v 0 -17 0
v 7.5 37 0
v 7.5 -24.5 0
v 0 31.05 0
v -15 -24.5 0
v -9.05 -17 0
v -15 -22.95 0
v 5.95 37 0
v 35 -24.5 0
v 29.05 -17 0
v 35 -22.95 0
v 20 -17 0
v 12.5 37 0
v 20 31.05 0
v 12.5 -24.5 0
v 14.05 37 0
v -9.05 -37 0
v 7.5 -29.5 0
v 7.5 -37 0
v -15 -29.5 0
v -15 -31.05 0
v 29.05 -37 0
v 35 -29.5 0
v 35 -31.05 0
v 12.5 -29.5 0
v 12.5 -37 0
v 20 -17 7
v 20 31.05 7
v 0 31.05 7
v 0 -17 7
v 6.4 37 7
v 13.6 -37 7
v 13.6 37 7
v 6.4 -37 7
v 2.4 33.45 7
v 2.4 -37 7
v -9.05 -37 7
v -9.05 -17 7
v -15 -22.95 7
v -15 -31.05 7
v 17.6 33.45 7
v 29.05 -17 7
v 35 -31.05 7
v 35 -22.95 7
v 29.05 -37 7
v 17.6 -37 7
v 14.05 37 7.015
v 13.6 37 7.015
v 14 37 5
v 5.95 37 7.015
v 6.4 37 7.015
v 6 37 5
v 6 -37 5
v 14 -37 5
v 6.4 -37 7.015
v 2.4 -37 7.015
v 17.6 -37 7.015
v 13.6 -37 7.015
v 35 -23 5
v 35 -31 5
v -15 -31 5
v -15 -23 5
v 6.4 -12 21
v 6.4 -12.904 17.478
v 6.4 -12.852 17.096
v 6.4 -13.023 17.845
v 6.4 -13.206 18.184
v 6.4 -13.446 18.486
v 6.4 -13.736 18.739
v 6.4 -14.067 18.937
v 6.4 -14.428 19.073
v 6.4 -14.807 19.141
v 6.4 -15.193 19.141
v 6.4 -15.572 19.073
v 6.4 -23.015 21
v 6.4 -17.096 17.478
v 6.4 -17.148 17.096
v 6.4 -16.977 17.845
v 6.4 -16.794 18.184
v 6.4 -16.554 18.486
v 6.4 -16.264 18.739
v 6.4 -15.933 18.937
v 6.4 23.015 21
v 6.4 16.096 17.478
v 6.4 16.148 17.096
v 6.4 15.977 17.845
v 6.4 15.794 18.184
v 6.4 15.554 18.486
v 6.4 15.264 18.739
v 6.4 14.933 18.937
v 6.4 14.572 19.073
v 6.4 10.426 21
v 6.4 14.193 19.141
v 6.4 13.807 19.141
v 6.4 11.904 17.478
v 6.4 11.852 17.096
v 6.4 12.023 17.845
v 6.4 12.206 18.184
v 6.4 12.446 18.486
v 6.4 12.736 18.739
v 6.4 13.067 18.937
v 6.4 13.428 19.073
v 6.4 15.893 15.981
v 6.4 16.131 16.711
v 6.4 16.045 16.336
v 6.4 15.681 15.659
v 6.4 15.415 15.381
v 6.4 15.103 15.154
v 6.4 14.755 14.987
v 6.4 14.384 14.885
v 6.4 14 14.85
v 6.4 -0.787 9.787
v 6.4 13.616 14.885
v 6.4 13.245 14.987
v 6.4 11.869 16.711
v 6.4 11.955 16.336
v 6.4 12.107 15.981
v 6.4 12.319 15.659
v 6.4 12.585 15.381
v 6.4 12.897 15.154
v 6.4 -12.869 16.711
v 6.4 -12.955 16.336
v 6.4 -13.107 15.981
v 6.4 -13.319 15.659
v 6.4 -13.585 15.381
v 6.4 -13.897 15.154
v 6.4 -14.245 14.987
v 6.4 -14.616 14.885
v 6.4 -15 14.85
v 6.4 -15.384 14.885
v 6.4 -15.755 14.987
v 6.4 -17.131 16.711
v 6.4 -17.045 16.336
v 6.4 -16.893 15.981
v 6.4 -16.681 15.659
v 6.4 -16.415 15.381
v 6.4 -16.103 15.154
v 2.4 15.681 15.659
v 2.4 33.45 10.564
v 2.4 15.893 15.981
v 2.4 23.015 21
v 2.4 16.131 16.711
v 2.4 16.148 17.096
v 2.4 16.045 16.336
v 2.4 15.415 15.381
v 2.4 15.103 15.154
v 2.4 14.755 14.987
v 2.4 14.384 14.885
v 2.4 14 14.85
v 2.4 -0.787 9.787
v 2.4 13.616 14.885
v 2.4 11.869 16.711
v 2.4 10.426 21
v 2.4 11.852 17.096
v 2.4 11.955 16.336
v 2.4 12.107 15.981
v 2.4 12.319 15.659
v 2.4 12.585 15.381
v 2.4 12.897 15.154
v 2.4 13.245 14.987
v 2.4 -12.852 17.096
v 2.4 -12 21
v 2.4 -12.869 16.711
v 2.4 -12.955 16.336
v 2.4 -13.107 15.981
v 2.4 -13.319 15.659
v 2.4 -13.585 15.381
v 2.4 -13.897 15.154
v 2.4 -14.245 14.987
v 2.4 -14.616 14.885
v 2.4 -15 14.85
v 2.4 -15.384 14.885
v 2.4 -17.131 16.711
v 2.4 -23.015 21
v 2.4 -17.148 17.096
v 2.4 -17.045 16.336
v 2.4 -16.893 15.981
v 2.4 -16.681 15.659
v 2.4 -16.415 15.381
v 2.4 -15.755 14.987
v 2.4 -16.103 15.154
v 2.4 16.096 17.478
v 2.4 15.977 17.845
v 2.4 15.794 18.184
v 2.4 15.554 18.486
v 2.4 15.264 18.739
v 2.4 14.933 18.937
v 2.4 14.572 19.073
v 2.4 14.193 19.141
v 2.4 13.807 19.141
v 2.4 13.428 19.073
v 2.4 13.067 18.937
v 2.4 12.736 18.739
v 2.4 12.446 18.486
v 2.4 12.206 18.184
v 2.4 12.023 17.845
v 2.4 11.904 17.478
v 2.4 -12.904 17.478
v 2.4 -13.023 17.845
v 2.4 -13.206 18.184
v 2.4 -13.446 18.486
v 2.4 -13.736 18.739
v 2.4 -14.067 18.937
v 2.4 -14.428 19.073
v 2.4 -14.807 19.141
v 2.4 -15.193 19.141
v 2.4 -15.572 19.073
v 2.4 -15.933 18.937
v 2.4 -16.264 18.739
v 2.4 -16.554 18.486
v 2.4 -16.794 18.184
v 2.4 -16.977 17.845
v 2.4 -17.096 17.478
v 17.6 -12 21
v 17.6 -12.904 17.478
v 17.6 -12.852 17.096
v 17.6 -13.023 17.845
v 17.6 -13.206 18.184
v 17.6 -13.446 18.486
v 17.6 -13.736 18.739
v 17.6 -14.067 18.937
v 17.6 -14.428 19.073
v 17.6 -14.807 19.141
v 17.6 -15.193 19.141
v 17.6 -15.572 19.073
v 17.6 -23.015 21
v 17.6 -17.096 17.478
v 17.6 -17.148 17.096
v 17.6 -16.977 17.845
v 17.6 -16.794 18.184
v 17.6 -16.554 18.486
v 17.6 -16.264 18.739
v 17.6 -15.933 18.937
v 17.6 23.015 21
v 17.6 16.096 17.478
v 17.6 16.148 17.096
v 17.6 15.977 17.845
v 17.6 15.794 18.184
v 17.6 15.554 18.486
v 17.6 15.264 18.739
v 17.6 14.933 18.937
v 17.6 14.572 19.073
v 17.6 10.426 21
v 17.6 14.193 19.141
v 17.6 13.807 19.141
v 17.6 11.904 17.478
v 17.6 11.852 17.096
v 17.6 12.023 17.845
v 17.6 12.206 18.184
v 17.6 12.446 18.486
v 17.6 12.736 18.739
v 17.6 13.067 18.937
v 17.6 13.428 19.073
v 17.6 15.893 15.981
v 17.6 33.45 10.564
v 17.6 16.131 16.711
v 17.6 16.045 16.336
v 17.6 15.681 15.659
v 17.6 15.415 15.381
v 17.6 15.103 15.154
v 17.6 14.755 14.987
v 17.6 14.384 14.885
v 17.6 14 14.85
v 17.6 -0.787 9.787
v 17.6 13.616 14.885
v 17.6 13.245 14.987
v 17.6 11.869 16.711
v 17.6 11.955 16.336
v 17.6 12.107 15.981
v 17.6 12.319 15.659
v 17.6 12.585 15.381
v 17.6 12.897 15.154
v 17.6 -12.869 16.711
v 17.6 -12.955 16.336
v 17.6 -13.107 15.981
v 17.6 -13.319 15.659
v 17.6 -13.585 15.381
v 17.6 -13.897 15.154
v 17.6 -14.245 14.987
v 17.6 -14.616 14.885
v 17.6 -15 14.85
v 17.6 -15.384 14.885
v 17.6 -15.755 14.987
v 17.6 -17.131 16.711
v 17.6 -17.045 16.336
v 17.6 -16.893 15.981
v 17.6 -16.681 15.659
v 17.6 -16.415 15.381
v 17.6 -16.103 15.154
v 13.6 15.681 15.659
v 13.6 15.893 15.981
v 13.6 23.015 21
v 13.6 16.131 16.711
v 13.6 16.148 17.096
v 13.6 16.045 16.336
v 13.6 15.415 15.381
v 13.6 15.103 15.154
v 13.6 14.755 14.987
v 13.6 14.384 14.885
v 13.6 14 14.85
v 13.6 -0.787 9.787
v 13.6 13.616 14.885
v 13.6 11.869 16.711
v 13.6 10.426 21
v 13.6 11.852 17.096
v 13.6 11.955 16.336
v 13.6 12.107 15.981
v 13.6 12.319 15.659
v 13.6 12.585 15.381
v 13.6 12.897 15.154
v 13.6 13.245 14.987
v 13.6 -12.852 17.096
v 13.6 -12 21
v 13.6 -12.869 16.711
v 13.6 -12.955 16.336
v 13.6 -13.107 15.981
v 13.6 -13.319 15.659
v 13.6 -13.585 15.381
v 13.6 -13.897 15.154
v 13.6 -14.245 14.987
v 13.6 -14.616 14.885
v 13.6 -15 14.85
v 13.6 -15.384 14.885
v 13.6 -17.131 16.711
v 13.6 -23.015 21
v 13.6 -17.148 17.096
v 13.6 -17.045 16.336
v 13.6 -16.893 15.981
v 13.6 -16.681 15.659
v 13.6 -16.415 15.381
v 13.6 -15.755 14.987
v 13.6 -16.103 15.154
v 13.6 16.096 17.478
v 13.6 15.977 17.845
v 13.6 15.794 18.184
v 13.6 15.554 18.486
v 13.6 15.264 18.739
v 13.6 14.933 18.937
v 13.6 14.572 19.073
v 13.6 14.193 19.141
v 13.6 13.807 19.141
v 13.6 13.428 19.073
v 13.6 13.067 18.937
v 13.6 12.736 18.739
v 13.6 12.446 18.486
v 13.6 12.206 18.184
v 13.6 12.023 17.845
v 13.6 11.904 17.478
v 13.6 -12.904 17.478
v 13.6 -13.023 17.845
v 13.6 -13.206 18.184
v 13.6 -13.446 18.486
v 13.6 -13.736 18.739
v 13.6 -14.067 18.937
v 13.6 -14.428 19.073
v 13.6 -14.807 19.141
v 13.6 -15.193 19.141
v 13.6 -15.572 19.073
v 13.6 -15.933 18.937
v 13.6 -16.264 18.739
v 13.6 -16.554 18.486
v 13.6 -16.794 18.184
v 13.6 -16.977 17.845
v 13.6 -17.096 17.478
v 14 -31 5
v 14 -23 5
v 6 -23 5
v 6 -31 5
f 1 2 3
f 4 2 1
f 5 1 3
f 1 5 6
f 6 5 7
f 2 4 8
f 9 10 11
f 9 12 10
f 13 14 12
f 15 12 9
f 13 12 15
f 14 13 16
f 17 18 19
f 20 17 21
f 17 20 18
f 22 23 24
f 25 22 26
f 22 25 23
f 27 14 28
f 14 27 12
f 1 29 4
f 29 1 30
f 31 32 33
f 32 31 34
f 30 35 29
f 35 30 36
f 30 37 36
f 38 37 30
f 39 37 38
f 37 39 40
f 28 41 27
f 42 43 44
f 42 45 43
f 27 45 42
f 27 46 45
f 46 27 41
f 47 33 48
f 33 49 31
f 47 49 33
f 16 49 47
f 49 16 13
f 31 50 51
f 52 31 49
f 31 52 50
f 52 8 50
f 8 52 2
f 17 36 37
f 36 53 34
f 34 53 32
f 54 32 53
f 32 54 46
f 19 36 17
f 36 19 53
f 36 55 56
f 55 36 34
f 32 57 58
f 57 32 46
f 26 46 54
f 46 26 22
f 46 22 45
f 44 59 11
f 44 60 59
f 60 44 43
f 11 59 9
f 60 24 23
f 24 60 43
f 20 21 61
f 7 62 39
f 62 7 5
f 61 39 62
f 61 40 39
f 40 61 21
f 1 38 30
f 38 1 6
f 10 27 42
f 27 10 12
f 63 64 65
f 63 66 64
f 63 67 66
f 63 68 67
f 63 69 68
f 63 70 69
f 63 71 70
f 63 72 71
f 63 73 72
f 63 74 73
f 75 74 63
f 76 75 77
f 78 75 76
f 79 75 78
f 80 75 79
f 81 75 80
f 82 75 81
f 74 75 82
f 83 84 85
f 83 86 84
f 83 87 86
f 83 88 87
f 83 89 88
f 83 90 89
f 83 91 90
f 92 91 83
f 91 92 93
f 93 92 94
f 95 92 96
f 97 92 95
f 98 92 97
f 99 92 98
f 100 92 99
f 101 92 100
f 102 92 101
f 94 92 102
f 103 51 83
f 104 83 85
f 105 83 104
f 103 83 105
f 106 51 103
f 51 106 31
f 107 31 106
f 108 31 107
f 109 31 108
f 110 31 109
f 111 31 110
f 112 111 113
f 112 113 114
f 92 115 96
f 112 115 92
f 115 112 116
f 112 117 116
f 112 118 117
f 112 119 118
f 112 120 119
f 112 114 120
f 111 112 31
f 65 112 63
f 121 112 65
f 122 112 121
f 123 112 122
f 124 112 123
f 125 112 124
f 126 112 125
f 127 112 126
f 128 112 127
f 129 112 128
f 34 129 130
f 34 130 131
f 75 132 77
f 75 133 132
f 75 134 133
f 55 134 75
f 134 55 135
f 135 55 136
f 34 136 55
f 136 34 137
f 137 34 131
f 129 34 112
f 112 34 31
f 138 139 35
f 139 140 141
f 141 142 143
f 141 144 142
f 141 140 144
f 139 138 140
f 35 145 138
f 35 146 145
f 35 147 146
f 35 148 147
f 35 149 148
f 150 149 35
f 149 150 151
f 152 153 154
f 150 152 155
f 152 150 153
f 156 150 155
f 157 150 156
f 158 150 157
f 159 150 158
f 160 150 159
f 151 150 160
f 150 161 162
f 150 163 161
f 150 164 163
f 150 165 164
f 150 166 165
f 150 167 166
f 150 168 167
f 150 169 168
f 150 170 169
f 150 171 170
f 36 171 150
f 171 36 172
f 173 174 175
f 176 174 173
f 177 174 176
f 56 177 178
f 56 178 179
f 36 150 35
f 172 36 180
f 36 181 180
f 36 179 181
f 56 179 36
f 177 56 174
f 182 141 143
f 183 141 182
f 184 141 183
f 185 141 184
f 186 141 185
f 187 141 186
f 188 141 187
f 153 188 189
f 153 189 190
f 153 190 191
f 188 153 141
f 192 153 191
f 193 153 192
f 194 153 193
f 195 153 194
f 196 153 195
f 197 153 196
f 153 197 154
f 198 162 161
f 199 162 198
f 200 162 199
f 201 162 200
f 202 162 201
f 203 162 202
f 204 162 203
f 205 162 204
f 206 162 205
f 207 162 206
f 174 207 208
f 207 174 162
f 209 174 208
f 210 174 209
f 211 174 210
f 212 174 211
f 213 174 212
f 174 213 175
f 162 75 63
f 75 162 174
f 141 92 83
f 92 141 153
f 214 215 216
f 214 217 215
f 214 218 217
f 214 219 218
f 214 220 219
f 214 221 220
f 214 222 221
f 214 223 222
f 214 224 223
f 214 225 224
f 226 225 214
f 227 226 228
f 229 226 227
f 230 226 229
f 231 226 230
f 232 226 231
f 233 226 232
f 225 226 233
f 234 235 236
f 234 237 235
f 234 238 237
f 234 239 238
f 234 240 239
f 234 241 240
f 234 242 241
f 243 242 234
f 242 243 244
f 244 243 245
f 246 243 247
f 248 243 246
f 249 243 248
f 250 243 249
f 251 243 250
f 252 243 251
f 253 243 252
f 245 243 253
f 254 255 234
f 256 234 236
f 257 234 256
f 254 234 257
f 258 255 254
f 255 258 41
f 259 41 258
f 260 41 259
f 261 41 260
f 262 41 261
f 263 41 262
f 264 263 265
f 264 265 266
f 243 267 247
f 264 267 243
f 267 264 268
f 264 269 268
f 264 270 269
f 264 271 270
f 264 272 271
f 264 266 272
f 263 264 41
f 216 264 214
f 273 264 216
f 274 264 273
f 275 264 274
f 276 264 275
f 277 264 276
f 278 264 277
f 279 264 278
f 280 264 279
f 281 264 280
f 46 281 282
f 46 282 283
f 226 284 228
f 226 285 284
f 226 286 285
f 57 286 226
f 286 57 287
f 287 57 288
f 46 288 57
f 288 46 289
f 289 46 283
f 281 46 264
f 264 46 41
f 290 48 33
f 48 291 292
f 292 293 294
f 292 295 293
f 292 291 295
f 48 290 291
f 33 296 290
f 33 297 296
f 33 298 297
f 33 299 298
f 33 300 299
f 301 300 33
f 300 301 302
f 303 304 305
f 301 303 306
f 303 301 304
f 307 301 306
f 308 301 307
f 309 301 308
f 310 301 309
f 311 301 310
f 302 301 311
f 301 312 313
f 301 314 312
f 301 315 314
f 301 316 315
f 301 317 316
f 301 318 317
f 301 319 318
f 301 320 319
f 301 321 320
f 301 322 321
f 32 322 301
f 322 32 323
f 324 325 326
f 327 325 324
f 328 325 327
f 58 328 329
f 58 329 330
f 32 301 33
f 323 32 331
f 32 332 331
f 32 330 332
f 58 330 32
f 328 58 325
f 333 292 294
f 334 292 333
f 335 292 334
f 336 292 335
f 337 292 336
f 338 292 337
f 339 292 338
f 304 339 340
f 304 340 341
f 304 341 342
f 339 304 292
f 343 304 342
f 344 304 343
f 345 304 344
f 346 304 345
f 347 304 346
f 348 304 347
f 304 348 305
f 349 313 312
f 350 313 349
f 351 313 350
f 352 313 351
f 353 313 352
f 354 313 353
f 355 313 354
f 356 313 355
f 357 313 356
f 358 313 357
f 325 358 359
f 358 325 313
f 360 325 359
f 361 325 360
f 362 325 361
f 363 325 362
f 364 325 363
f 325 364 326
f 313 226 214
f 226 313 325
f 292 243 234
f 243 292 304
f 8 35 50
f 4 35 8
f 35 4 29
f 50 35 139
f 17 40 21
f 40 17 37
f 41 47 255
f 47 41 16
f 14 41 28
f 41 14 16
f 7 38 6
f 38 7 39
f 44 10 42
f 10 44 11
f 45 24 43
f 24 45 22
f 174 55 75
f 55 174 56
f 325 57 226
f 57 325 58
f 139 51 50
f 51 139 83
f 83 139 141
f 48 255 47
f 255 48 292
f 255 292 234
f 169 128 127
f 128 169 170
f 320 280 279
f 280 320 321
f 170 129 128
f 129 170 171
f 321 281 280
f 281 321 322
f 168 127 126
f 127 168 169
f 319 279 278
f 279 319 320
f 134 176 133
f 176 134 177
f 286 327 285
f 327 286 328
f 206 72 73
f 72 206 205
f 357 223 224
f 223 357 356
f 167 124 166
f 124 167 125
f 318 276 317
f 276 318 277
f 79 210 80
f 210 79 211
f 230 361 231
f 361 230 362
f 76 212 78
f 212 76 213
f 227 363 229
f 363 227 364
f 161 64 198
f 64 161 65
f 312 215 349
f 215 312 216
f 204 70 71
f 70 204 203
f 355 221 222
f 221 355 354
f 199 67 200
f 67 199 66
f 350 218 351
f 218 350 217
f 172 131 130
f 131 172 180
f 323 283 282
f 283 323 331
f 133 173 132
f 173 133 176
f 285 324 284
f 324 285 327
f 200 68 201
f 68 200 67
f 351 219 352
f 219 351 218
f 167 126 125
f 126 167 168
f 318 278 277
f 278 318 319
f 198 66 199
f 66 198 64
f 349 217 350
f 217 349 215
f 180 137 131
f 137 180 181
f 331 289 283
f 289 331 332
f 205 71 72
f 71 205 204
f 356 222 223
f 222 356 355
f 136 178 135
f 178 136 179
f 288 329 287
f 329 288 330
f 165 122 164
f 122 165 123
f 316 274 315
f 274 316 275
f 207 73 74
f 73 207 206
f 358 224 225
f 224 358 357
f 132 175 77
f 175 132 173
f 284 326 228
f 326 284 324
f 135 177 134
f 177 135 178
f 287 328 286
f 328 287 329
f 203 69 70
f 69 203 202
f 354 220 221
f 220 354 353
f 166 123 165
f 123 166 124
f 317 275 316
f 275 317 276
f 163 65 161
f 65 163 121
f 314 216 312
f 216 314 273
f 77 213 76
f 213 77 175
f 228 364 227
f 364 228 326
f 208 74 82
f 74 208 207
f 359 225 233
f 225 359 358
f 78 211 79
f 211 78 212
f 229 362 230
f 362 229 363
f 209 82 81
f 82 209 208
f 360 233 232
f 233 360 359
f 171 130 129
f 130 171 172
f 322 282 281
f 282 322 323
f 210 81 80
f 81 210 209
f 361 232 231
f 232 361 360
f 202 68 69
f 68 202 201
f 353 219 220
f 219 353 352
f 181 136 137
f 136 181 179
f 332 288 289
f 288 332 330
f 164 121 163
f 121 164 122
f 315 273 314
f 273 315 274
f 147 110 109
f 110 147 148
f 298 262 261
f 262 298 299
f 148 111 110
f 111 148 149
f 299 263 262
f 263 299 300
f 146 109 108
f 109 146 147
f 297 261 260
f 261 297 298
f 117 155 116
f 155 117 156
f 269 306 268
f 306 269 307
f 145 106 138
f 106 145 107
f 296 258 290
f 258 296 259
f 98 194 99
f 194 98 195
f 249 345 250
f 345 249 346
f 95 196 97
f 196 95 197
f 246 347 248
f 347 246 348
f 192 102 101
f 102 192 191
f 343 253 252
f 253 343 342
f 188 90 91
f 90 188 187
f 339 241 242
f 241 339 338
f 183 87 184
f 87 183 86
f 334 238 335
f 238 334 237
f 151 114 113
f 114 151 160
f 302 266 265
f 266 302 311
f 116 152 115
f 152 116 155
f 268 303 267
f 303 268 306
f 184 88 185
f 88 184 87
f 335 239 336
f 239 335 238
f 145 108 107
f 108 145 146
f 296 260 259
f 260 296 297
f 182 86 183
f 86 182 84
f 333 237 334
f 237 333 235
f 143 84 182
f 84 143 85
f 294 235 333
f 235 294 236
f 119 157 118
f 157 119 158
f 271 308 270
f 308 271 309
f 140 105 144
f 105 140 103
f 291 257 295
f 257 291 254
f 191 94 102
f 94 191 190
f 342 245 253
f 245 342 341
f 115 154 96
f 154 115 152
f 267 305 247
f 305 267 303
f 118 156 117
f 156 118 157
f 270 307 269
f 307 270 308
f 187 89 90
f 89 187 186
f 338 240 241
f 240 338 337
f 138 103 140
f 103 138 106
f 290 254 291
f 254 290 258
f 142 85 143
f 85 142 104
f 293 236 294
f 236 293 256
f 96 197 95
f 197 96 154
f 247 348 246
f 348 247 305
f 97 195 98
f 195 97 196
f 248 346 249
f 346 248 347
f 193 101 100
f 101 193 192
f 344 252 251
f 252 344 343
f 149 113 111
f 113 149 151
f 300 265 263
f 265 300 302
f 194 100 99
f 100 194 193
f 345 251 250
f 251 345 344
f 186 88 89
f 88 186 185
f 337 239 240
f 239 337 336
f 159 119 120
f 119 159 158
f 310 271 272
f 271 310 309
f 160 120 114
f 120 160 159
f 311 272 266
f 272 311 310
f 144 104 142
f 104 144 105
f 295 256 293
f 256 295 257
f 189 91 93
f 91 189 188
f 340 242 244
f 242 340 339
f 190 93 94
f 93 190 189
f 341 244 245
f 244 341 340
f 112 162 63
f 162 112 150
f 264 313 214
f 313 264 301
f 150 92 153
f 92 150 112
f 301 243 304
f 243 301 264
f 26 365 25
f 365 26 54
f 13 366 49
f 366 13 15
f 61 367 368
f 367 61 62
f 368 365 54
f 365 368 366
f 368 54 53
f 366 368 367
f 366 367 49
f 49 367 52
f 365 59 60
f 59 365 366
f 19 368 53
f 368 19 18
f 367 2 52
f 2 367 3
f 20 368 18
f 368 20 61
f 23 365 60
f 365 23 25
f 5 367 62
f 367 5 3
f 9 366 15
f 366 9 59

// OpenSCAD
// file: globals.scad
/*
Most things in this file is represented as one millimeter, so keep that in mind while changing things.
Some of the setting are not mm but at variables that you can set, such as 2*x=2x and you are setting what x is.
I will try to specify when things are variables and not exact measurements.
*/

// printer slop
slop = 0.15;

obj_leg = 30;
leg_length = 5.5;
small_number = 0.001;
metal_core_rode_global = 5;


///////////////// number of holes /////////////////////
z_hole_number = 8;
other_holes = 8;

///////////////// Pins /////////////////////

//pins that poke out
ball_size = 10;
pin_height = 20;
pin_diameter = 6;


//holes
hole_ball_size = ball_size;
hole_pin_height = pin_height;
hole_pin_diameter = pin_diameter;

///////////////// Z THINGS /////////////////////

berring_slot_width = 7.5;
berring_slot_depth = 6.5;
metal_core_rode = 5;

///////////////// X THINGS /////////////////////

//male dove tails
male_dove_max_width=8;
male_dove_min_width=5;
male_dove_depth=5;
male_dove_height=obj_leg/2;

function scaled_male_dove_max_width() = male_dove_max_width - slop;
function scaled_male_dove_min_width() = male_dove_min_width - slop;
function scaled_male_dove_depth() = male_dove_depth - slop;

//female dove tails, this is found on the y mounts
girl_max_width=11;
girl_min_width=5;
girl_depth=5;
girl_height=obj_leg;


///////////////// Y THINGS /////////////////////
/*
The Y is so normal that all of those global variables at the top should change all of the setting in it, this section is set her incase there are variables set in the future development of this project.
*/

// stepper
motor_side_length = 43.2;
motor_bolt_hole_distance = 31;
motor_center_hole = 23;
motor_shaft_dia = 5;
motor_shaft_hole_dia = 5+2*slop;

// bolts etc.
bolt_hole_dia = 3+2*slop;
bolt_head_hole_dia = 5.8;

m4_bolt_hole_dia = 4+2*slop;
m4_bolt_head_hole_dia = 6.8+2*slop;


m3_nut_side = 5.65;
m4_nut_side = 6.85;

// threaded rod
lifter_rod_diam = 9.86;
hole_threaded_rod = lifter_rod_diam+2*slop;
// file: long_bow_tie.scad
tilt_level = 1.1;

include <include.scad>;
include <globals.scad>;

obj_leg = 12;

max_width=scaled_male_dove_max_width();
min_width=scaled_male_dove_min_width();
depth=scaled_male_dove_depth();
length = 50;

module bow_tie_master(length){
	union(){
		mirror([0,1,0])	dovetail_3d(max_width, min_width, depth, length);
		dovetail_3d(max_width, min_width, depth, length);
	}
}

module long_bow_tie(length) {
    translate([0,0,depth]) intersection(){
        rotate([90,0,0]) bow_tie_master(length);
        rotate([90,0,0]) cylinder(r=5.8, h=200);
    }
}

long_bow_tie(length);
// main file
use <long_bow_tie.scad>;
include <include.scad>;
include <globals.scad>;

$fn=35;


module fixing_plate() {
    difference() {
        union () {
            translate([-14.5,0,10]) cube([7,74,20], center = true);
            translate([-14.5,-74/2+20/2,10]) cube([7,20,50], center = true);
            translate([-25,0,4.4]) cube([14, 74, 4], center=true);
            translate([-25,0,15.6]) cube([14, 74, 4], center=true);
        }
		union() {
			// fixing plate cutout
			translate([-16,36,0]) rotate([45,0,0]) cube([16,16,7], center = true);
			translate([-16,-35,-16]) rotate([135,0,0]) cube([16,16,7], center = true);
			translate([-16,36,20]) rotate([135,0,0]) cube([16,16,7], center = true);
			translate([-16,-19,-16]) rotate([45,0,0]) cube([16,16,7], center = true);
            
            translate([-16,-19,36]) rotate([135,0,0]) cube([16,16,7], center = true);
            translate([-16,-35,36]) rotate([45,0,0]) cube([16,16,7], center = true);
            
            translate([-27.5,-36,10]) rotate([90,0,-45]) cube([26,16,12], center = true);
            translate([-27.5,36,10]) rotate([90,0,45]) cube([26,16,12], center = true);
		}
        translate([-28,-15,0]) cylinder(d=m4_bolt_hole_dia, h=20);
        translate([-28,14,0]) cylinder(d=m4_bolt_hole_dia, h=20);
        

        translate([-42,-22,0]) rotate([0,0,45]) cube([30,30,30]);
	}
}

module do_shy_rockabilly_mount() {
    difference() {
        translate([0,0,-11]) rotate([0,90,0]) fixing_plate();
        translate([10,40,0]) rotate([90,0,0]) male_dovetail(height=80);
        translate([40,-27,0]) rotate([90,0,-90]) male_dovetail(height=80);
    }
}

do_shy_rockabilly_mount();
